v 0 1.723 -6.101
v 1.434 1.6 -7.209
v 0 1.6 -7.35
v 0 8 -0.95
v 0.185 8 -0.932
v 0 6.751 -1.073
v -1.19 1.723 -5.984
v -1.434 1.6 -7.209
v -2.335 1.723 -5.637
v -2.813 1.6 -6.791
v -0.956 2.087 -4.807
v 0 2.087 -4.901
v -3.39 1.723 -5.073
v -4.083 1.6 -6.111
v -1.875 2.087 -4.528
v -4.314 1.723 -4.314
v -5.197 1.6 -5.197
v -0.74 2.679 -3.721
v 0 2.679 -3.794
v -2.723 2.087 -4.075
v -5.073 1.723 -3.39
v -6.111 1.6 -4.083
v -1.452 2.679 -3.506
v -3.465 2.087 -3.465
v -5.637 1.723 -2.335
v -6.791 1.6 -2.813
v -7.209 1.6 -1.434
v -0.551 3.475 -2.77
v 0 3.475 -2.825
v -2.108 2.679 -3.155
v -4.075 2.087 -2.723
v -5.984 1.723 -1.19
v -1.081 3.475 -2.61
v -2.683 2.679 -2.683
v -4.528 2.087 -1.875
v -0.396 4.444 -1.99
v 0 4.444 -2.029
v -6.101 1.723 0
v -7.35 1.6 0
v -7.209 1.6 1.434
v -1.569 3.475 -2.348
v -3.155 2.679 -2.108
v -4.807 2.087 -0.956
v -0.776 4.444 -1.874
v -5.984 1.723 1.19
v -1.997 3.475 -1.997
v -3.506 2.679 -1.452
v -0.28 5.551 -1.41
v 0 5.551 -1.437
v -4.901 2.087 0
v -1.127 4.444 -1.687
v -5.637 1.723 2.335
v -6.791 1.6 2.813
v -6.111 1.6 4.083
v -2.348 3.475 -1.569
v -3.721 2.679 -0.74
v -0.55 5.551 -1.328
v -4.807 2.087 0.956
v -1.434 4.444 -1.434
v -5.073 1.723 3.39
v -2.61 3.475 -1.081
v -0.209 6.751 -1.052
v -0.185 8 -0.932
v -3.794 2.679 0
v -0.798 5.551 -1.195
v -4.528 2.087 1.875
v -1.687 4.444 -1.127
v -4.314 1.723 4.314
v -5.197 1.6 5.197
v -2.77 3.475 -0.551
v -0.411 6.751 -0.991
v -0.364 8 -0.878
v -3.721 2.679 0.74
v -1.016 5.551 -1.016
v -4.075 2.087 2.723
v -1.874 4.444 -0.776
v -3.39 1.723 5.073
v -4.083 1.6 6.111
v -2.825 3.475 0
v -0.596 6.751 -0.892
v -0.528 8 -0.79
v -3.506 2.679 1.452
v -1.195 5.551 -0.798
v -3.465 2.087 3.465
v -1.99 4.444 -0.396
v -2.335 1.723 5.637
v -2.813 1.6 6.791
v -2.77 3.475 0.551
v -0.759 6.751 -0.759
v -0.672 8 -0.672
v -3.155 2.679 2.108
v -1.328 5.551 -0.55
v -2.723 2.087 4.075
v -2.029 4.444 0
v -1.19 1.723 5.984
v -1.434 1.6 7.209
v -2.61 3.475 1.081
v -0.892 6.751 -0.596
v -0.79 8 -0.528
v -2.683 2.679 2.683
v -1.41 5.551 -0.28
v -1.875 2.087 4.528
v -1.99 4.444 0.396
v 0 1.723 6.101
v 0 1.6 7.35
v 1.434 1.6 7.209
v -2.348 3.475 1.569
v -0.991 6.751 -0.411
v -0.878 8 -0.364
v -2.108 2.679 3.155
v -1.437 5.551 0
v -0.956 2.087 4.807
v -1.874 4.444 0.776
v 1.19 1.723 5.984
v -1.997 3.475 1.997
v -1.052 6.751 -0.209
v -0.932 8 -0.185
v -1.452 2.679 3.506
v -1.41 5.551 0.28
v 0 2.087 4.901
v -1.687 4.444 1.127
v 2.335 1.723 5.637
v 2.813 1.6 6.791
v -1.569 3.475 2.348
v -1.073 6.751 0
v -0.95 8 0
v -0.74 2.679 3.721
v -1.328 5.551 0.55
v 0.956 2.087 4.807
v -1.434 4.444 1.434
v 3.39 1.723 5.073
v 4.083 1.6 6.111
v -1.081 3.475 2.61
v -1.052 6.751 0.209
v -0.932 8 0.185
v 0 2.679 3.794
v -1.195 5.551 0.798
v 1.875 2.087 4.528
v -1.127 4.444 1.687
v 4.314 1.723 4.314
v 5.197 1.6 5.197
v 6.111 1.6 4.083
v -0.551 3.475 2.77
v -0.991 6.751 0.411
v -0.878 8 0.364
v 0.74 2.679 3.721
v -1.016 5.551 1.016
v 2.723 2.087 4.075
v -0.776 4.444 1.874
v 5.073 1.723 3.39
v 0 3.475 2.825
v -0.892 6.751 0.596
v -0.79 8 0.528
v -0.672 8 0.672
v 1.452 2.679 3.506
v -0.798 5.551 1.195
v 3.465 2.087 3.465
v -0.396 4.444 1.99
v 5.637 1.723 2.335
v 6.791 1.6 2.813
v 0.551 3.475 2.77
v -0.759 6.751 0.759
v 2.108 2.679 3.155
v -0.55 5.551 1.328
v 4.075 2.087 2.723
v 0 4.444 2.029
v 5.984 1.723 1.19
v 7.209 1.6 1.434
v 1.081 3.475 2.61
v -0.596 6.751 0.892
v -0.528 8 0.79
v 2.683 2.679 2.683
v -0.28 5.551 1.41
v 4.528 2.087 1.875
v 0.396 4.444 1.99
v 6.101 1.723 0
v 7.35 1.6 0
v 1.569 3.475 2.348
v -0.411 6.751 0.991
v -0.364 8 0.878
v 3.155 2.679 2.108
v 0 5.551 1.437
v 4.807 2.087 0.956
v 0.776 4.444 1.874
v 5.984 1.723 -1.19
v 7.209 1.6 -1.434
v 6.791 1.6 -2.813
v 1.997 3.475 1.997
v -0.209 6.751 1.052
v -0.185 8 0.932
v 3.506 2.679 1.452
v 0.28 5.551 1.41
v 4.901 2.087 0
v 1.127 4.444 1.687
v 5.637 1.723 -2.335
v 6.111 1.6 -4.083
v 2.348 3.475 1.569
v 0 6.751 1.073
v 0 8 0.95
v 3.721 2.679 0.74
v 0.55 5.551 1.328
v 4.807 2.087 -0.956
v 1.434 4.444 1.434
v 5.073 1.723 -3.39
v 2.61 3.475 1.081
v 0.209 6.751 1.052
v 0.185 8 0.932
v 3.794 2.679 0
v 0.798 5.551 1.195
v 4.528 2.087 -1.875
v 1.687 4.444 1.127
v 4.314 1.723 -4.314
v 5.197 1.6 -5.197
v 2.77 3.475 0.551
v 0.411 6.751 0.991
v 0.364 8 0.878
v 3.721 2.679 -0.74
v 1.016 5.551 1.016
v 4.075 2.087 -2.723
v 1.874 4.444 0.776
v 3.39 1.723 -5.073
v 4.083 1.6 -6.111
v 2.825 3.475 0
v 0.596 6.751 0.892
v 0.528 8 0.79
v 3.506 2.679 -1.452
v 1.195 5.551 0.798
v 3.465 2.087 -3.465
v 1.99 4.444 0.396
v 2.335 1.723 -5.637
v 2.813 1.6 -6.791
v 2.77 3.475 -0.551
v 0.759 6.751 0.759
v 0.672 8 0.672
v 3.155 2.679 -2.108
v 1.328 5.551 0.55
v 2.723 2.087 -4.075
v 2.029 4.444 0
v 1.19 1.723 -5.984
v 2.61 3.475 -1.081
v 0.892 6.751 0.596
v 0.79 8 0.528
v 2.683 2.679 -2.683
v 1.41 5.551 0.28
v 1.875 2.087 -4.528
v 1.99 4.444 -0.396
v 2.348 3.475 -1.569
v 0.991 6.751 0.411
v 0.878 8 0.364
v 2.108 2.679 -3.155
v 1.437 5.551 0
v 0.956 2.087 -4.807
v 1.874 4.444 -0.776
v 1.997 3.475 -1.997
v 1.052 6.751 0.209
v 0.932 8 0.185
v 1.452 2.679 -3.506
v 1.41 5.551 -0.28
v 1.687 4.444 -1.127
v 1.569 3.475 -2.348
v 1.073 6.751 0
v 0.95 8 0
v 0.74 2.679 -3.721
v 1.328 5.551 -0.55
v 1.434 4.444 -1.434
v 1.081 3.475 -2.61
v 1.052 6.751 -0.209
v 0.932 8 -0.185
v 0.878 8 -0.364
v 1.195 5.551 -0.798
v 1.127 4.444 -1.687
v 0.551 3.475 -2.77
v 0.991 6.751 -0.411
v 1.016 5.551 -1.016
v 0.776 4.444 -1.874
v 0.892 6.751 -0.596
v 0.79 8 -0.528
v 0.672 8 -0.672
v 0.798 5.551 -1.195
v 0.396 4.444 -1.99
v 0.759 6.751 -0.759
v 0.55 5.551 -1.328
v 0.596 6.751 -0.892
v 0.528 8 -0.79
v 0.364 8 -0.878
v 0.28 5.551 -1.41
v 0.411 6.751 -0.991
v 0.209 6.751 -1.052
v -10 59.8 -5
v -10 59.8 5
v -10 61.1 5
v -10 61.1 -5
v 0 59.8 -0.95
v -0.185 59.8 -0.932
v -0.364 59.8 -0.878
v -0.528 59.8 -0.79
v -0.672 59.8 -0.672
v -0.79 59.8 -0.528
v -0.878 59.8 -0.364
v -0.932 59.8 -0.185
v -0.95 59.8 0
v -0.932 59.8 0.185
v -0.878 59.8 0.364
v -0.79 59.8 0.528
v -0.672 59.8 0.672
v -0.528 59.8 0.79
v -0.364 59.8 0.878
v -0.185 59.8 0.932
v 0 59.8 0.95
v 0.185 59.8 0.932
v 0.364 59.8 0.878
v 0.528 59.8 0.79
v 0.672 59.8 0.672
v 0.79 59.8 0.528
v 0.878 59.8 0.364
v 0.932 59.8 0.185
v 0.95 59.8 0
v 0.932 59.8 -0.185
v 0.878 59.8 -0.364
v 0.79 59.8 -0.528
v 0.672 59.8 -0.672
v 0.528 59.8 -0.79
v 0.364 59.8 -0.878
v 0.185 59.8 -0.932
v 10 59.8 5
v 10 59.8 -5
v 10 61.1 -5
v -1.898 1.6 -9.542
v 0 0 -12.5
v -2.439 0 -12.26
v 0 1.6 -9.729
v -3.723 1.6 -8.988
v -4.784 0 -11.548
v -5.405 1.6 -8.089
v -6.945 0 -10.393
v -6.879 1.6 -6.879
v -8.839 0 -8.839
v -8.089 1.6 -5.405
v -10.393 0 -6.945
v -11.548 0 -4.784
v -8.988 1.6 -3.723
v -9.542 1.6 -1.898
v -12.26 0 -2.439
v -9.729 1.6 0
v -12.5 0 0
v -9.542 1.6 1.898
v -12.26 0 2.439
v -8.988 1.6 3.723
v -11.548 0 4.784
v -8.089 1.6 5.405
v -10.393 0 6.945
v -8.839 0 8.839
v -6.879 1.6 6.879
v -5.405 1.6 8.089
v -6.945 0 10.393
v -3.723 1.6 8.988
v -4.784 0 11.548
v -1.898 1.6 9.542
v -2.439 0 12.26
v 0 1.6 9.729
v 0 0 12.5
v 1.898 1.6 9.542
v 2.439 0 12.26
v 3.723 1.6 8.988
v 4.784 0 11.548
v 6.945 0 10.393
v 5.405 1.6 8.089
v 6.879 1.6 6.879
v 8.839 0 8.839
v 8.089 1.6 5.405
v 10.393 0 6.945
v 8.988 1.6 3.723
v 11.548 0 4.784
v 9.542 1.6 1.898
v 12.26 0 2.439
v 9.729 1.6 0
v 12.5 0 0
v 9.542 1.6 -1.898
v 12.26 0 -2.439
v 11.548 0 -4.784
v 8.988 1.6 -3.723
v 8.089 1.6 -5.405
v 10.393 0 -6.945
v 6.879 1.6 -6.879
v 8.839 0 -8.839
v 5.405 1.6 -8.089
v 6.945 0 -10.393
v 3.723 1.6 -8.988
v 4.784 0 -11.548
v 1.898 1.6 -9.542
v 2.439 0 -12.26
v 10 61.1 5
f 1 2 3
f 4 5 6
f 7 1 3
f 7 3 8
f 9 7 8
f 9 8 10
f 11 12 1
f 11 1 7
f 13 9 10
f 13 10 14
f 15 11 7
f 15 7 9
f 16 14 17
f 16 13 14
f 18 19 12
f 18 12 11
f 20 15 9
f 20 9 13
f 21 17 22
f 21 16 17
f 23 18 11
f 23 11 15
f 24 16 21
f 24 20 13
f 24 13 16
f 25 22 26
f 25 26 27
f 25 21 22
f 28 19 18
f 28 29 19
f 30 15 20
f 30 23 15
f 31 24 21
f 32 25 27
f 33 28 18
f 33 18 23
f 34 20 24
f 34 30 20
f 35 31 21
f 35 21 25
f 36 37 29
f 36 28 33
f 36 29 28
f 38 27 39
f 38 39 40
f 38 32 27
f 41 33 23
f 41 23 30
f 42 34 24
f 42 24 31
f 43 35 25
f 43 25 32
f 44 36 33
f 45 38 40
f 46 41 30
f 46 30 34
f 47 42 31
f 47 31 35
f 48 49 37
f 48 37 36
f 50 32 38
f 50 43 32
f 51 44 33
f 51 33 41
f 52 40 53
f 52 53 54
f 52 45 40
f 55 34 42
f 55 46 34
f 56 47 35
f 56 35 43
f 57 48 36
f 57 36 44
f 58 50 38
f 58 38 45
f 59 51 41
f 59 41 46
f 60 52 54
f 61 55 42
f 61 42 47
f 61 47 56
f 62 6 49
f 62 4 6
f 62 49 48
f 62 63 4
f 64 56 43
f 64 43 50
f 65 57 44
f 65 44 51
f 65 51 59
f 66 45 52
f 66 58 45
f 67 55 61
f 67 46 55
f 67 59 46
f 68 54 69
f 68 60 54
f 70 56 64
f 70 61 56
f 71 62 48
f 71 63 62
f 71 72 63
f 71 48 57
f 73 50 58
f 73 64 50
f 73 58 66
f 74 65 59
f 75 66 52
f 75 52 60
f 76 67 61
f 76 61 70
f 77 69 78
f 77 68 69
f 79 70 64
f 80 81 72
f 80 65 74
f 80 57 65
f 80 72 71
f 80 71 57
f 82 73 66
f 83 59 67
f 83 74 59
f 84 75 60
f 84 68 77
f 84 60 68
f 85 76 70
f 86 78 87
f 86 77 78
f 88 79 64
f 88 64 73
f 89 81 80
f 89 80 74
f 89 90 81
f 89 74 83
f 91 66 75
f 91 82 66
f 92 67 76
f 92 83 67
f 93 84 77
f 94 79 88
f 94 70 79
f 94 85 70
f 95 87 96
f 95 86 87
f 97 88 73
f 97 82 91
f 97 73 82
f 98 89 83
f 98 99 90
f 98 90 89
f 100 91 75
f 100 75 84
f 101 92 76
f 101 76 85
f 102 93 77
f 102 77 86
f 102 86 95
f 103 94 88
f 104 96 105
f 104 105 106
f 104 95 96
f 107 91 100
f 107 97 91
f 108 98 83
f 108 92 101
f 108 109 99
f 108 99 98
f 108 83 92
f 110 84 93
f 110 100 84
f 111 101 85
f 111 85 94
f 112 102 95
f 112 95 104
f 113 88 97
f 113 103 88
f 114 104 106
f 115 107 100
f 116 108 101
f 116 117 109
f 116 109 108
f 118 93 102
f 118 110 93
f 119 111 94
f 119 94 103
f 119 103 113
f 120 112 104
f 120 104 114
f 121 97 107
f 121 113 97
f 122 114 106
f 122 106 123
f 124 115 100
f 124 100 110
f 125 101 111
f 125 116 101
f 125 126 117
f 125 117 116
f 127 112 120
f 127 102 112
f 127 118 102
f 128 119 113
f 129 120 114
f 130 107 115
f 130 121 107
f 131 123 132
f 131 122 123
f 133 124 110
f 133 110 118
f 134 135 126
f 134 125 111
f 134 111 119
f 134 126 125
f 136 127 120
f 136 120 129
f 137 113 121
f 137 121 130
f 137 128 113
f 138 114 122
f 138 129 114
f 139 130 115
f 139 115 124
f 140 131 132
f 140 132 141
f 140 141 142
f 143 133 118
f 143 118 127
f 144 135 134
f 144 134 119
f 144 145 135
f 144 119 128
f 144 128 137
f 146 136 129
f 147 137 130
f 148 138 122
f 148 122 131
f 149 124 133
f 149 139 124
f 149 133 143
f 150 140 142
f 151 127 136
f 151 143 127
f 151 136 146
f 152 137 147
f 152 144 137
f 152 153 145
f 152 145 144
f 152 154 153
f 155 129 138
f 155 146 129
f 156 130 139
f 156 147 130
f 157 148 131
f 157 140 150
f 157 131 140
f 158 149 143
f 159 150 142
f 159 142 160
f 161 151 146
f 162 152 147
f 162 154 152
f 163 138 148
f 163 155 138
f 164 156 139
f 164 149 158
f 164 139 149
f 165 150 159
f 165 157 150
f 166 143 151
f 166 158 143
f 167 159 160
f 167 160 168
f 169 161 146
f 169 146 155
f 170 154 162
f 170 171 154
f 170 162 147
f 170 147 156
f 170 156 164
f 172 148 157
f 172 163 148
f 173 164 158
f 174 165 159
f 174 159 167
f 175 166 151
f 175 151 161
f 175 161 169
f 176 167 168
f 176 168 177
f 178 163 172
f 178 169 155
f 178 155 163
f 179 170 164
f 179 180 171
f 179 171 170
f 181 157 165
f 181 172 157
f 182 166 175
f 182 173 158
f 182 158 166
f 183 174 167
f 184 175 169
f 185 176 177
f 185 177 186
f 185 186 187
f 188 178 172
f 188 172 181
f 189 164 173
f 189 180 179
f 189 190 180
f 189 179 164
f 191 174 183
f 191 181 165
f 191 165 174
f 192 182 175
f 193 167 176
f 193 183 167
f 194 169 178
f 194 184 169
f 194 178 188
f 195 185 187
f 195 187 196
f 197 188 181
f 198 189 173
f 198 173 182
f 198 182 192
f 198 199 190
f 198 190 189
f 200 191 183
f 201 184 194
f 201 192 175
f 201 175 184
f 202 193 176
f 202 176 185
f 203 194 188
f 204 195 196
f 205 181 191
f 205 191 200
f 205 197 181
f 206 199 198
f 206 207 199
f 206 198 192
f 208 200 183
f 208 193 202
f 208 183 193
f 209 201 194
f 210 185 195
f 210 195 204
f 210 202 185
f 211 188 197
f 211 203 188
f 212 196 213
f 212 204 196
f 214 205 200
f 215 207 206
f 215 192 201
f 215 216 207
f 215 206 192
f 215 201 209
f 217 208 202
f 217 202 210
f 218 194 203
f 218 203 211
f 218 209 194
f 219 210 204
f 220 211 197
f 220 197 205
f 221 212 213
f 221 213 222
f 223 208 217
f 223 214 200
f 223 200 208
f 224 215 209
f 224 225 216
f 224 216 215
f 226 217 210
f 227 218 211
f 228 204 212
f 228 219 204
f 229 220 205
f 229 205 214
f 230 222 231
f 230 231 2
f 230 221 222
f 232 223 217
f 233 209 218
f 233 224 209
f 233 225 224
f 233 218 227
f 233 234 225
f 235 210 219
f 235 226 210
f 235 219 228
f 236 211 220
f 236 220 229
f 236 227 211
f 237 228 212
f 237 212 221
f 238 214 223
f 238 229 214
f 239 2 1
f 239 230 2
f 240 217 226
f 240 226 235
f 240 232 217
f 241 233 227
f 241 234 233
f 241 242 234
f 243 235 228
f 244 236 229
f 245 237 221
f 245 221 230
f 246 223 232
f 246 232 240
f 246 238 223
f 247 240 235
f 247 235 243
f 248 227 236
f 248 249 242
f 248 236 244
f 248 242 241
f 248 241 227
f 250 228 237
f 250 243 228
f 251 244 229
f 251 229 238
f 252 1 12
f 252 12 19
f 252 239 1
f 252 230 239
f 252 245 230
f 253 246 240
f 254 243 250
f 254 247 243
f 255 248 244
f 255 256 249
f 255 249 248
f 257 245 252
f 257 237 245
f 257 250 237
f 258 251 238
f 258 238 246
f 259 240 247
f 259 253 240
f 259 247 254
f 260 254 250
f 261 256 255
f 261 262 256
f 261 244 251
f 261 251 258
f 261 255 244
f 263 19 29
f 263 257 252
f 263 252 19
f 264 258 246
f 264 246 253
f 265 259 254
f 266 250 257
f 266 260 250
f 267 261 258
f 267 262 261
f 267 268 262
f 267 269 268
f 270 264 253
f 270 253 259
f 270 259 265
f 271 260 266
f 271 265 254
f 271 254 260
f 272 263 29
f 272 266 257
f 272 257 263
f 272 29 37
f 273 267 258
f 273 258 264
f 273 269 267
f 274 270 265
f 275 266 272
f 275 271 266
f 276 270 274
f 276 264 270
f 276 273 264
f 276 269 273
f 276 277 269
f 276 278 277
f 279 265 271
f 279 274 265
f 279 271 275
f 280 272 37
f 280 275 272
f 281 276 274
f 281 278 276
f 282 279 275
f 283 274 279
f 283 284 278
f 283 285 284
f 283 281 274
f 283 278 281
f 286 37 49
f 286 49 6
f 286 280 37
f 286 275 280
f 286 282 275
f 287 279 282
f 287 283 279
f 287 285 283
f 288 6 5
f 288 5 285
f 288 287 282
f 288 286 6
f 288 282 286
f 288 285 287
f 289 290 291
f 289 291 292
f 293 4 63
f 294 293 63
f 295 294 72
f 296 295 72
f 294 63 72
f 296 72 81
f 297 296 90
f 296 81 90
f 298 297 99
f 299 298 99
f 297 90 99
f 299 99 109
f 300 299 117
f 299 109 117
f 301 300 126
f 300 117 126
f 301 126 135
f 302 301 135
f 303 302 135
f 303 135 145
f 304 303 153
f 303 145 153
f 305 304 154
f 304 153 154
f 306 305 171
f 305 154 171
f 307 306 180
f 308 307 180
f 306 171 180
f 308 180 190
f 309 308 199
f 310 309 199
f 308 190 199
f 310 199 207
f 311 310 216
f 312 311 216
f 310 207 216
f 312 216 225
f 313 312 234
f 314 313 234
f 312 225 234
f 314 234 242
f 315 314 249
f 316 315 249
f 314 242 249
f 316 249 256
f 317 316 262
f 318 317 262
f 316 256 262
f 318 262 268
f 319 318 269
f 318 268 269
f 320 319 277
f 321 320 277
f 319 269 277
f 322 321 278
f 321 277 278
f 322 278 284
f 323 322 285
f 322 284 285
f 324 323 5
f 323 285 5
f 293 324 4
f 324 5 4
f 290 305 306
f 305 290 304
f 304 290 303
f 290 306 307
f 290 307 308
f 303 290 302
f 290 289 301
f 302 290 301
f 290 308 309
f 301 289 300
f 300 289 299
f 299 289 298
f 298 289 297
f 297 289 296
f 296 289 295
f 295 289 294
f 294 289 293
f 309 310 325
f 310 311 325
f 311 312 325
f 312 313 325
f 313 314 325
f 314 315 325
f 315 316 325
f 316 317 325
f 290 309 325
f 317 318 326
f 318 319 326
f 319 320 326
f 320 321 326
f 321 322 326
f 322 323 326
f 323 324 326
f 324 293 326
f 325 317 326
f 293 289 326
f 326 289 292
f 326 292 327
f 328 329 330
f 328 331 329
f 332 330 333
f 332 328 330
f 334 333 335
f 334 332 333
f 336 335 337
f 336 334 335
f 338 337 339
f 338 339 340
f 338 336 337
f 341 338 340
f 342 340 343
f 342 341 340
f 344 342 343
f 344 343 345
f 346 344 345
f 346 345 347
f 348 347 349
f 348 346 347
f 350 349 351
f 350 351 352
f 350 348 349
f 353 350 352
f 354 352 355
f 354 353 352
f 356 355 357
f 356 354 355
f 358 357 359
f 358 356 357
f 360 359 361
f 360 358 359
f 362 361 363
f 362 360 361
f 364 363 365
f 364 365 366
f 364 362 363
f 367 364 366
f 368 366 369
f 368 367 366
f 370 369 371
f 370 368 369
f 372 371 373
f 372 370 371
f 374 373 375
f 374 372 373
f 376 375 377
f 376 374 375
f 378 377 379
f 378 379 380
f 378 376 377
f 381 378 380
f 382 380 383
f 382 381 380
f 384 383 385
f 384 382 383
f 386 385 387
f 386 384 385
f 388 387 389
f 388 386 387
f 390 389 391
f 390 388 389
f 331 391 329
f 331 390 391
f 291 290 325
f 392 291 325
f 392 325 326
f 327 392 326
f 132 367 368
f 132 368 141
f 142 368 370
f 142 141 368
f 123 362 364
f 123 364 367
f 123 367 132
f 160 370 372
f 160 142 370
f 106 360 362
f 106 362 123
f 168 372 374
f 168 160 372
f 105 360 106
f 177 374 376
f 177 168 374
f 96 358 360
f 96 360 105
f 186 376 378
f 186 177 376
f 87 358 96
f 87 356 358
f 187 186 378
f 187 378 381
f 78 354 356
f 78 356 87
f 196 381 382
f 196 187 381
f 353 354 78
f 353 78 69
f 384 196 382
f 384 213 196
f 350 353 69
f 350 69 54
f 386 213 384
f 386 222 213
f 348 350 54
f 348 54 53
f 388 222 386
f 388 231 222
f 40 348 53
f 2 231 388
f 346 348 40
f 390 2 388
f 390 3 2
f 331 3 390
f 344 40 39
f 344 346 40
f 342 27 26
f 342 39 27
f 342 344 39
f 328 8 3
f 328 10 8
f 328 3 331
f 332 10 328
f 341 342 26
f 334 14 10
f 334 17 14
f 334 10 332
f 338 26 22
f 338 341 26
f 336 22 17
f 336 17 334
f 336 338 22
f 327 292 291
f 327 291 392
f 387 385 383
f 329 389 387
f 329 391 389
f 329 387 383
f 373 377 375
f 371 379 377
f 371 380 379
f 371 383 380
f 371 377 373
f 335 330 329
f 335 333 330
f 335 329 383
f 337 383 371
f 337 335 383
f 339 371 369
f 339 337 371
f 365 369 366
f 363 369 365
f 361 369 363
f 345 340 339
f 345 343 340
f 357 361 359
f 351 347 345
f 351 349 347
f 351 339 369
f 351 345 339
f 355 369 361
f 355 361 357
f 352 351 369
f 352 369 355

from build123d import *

# Parameters (mm, degrees)
RACCORDO2_R                  = 6.4
SCHIZZO5_W                   = 20
SCHIZZO5_H                   = 10
ESTRUSIONE_ESTRUSIONE1_DEPTH = 1.3


with BuildPart() as part:
    # Schizzo4 → Rivoluzione9 (revolve)
    with BuildSketch(Plane.XY, mode=Mode.PRIVATE) as rivoluzione9_sk:
        Polygon((0, 0), (-12.5, 0), (-9.728718708, 1.6), (-0.95, 1.6), (-0.95, 8), (-0.95, 59.8), (0, 59.8), align=None)
    revolve(rivoluzione9_sk.sketch.rotate(Axis((0, -7.357121252, 0), (0, 1, 0)), 270), axis=Axis((0, -7.357121252, 0), (0, 1, 0)))

    # Raccordo2
    raccordo2_edges = [part.edges().sort_by_distance(p)[0] for p in [
        (0, 1.6, 0.95),
    ]]
    fillet(raccordo2_edges, radius=RACCORDO2_R)

    # Schizzo5 → Estrusione-Estrusione1 (add)
    with BuildSketch(Plane(origin=(0, 59.8, 0), x_dir=(1, 0, 0), z_dir=(0, 1, 0))):
        Rectangle(SCHIZZO5_W, SCHIZZO5_H)
    extrude(amount=ESTRUSIONE_ESTRUSIONE1_DEPTH)


solid = part.part
